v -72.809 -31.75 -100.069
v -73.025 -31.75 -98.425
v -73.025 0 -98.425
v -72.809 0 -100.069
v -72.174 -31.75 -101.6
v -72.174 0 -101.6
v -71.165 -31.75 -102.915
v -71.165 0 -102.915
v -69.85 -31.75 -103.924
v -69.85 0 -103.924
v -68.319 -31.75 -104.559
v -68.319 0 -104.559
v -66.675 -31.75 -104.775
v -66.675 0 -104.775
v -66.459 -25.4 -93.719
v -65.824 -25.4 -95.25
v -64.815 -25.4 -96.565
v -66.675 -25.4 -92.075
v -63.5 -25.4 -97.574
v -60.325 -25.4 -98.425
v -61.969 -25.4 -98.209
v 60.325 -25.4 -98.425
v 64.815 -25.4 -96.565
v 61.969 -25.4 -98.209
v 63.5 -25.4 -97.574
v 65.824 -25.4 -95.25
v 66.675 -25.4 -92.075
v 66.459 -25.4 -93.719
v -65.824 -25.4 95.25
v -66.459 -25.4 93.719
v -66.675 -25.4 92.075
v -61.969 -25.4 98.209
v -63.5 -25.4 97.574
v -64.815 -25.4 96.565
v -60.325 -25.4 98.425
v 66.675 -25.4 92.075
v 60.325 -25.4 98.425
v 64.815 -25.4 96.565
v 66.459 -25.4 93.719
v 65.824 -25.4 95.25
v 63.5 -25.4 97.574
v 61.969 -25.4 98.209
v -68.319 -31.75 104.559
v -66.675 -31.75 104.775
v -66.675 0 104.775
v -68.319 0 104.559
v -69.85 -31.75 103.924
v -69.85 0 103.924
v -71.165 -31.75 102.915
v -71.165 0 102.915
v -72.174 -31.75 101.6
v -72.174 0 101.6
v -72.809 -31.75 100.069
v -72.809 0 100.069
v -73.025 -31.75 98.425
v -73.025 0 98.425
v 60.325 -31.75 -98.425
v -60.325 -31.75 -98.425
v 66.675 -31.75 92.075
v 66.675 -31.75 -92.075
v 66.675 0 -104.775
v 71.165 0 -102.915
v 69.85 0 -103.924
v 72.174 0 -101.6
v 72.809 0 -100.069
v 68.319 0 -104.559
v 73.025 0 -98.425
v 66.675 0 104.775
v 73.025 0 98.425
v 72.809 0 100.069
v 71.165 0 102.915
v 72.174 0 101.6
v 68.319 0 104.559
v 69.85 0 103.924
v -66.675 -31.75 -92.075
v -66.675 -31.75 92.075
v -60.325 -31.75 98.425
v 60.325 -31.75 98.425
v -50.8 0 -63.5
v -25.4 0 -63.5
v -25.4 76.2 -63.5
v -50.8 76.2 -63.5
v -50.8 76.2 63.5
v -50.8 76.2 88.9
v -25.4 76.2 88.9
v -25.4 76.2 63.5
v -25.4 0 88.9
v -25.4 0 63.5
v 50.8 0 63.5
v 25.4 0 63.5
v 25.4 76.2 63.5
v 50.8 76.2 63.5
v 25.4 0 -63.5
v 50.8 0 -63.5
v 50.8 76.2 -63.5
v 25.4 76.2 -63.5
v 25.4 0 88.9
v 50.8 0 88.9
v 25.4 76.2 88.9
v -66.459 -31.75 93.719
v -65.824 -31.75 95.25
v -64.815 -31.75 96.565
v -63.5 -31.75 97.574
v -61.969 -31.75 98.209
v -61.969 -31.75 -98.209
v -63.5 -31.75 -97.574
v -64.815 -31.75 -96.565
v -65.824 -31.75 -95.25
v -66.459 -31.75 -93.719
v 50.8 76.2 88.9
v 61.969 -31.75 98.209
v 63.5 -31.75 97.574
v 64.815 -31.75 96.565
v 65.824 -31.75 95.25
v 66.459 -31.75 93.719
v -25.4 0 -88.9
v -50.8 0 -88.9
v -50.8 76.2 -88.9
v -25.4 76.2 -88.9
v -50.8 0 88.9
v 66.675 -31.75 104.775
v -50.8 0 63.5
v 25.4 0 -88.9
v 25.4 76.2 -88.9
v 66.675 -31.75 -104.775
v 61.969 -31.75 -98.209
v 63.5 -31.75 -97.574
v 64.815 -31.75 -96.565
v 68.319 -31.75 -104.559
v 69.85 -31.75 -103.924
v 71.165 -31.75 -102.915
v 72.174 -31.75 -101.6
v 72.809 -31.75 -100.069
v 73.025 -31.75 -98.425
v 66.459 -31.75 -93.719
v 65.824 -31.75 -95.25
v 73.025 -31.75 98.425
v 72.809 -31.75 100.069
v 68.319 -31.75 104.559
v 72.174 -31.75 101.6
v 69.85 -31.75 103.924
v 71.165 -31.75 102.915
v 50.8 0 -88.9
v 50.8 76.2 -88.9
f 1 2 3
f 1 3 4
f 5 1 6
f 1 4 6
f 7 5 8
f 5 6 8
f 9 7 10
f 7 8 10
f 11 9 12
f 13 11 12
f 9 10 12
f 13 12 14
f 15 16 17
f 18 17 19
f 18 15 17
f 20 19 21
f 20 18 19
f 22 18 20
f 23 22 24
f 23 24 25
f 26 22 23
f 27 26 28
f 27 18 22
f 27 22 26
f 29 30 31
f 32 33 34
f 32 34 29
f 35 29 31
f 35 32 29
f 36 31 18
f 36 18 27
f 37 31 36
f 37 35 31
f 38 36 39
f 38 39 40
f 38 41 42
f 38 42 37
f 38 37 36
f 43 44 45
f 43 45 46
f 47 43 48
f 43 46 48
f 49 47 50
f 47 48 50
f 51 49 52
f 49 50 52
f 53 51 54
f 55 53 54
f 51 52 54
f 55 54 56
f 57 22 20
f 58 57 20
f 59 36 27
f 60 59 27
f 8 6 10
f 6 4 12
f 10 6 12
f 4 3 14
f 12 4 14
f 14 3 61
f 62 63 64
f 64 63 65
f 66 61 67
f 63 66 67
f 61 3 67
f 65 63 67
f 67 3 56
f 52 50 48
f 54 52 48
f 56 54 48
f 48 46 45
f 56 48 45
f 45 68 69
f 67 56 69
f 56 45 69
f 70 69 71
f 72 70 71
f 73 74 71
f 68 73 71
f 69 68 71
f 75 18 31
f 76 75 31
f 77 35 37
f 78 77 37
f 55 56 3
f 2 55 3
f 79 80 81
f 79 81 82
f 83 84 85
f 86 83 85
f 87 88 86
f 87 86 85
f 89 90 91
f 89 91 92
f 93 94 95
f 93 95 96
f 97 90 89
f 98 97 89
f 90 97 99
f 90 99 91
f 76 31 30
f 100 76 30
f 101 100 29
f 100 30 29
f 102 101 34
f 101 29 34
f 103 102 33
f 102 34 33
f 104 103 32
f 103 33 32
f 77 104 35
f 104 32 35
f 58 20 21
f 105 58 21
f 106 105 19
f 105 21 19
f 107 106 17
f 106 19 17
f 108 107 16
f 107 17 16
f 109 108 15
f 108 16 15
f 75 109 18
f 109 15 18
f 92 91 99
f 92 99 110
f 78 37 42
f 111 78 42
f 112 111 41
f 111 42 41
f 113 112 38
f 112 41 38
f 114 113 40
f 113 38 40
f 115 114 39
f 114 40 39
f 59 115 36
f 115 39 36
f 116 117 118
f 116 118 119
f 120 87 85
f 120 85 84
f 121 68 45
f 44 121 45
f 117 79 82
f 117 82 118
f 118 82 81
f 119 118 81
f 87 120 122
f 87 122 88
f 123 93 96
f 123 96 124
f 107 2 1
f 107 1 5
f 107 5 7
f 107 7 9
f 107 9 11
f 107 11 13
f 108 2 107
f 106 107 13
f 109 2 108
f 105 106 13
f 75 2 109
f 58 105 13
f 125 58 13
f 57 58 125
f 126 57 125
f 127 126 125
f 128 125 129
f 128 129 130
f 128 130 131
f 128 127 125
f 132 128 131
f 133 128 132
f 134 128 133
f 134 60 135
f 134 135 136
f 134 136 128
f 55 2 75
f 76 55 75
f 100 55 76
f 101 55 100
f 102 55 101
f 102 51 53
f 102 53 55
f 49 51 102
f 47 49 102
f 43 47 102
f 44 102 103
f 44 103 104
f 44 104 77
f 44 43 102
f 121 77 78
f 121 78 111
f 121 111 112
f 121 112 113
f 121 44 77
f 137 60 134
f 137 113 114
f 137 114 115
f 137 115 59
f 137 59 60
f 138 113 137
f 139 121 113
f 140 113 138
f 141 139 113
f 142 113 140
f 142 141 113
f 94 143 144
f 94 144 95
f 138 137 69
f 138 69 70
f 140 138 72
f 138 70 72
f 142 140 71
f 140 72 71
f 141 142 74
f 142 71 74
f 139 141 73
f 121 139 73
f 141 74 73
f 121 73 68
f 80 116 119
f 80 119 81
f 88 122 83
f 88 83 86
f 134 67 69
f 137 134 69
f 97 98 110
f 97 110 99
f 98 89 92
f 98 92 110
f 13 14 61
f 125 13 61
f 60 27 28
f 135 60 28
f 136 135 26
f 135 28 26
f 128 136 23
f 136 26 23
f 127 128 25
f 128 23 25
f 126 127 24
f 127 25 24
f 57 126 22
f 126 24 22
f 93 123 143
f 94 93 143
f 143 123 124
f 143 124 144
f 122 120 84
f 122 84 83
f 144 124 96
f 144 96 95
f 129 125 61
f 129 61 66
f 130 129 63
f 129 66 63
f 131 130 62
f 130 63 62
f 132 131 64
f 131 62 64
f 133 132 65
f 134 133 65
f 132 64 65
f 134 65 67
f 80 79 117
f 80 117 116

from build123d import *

# Parameters (mm, degrees)
F1_DEPTH = 25.4
F2_DEPTH = 31.75
F3_DEPTH = 76.2


with BuildPart() as f1:
    # F0 (on Front) → F1 (new body)
    with BuildSketch(Plane.XZ):
        with BuildLine():
            ThreePointArc((66.675, 92.075), (64.8151280605, 96.5651280605), (60.325, 98.425))
            Line((60.325, 98.425), (-60.325, 98.425))
            ThreePointArc((-60.325, 98.425), (-64.8151280605, 96.5651280605), (-66.675, 92.075))
            Line((-66.675, 92.075), (-66.675, -92.075))
            ThreePointArc((-66.675, -92.075), (-64.8151280605, -96.5651280605), (-60.325, -98.425))
            Line((-60.325, -98.425), (60.325, -98.425))
            ThreePointArc((60.325, -98.425), (64.8151280605, -96.5651280605), (66.675, -92.075))
            Line((66.675, -92.075), (66.675, 92.075))
        make_face()
        Polygon((-25.4, -63.5), (-25.4, -76.2), (-25.4, -88.9), (-50.8, -88.9), (-50.8, -63.5), align=None, mode=Mode.SUBTRACT)
        Polygon((25.4, -88.9), (25.4, -76.2), (25.4, -63.5), (50.8, -63.5), (50.8, -88.9), align=None, mode=Mode.SUBTRACT)
        Polygon((-25.4, 88.9), (-25.4, 76.2), (-25.4, 63.5), (-50.8, 63.5), (-50.8, 88.9), align=None, mode=Mode.SUBTRACT)
        Polygon((25.4, 63.5), (25.4, 76.2), (25.4, 88.9), (50.8, 88.9), (50.8, 63.5), align=None, mode=Mode.SUBTRACT)
        Polygon((-25.4, 63.5), (-25.4, 76.2), (-25.4, 88.9), (-50.8, 88.9), (-50.8, 63.5), align=None)
        Polygon((25.4, 88.9), (25.4, 76.2), (25.4, 63.5), (50.8, 63.5), (50.8, 88.9), align=None)
        Polygon((25.4, -63.5), (25.4, -76.2), (25.4, -88.9), (50.8, -88.9), (50.8, -63.5), align=None)
        Polygon((-25.4, -88.9), (-25.4, -76.2), (-25.4, -63.5), (-50.8, -63.5), (-50.8, -88.9), align=None)
    extrude(amount=F1_DEPTH)

    # F0 (on Front) → F2 (join)
    with BuildSketch(Plane.XZ):
        with BuildLine():
            ThreePointArc((-73.025, -98.425), (-71.1651280605, -102.9151280605), (-66.675, -104.775))
            Line((-66.675, -104.775), (66.675, -104.775))
            ThreePointArc((66.675, -104.775), (71.1651280605, -102.9151280605), (73.025, -98.425))
            Line((73.025, -98.425), (73.025, 98.425))
            ThreePointArc((73.025, 98.425), (71.1651280605, 102.9151280605), (66.675, 104.775))
            Line((66.675, 104.775), (-66.675, 104.775))
            ThreePointArc((-66.675, 104.775), (-71.1651280605, 102.9151280605), (-73.025, 98.425))
            Line((-73.025, 98.425), (-73.025, -98.425))
        make_face()
        with BuildLine():
            Line((-60.325, 98.425), (60.325, 98.425))
            ThreePointArc((60.325, 98.425), (64.8151280605, 96.5651280605), (66.675, 92.075))
            Line((66.675, 92.075), (66.675, -92.075))
            ThreePointArc((66.675, -92.075), (64.8151280605, -96.5651280605), (60.325, -98.425))
            Line((60.325, -98.425), (-60.325, -98.425))
            ThreePointArc((-60.325, -98.425), (-64.8151280605, -96.5651280605), (-66.675, -92.075))
            Line((-66.675, -92.075), (-66.675, 92.075))
            ThreePointArc((-66.675, 92.075), (-64.8151280605, 96.5651280605), (-60.325, 98.425))
        make_face(mode=Mode.SUBTRACT)
    extrude(amount=F2_DEPTH)


with BuildPart() as f3:
    # F0 (on Front) → F3 (new body)
    with BuildSketch(Plane.XZ):
        Polygon((-25.4, 63.5), (-25.4, 76.2), (-25.4, 88.9), (-50.8, 88.9), (-50.8, 63.5), align=None)
    extrude(amount=-F3_DEPTH)


with BuildPart() as f3b:
    # F0 (on Front) → F3, piece 2 (new body)
    with BuildSketch(Plane.XZ):
        Polygon((25.4, 88.9), (25.4, 76.2), (25.4, 63.5), (50.8, 63.5), (50.8, 88.9), align=None)
    extrude(amount=-F3_DEPTH)


with BuildPart() as f3c:
    # F0 (on Front) → F3, piece 3 (new body)
    with BuildSketch(Plane.XZ):
        Polygon((25.4, -63.5), (25.4, -76.2), (25.4, -88.9), (50.8, -88.9), (50.8, -63.5), align=None)
    extrude(amount=-F3_DEPTH)


with BuildPart() as f3d:
    # F0 (on Front) → F3, piece 4 (new body)
    with BuildSketch(Plane.XZ):
        Polygon((-25.4, -88.9), (-25.4, -76.2), (-25.4, -63.5), (-50.8, -63.5), (-50.8, -88.9), align=None)
    extrude(amount=-F3_DEPTH)


solid = Compound([f1.part, f3.part, f3b.part, f3c.part, f3d.part])
